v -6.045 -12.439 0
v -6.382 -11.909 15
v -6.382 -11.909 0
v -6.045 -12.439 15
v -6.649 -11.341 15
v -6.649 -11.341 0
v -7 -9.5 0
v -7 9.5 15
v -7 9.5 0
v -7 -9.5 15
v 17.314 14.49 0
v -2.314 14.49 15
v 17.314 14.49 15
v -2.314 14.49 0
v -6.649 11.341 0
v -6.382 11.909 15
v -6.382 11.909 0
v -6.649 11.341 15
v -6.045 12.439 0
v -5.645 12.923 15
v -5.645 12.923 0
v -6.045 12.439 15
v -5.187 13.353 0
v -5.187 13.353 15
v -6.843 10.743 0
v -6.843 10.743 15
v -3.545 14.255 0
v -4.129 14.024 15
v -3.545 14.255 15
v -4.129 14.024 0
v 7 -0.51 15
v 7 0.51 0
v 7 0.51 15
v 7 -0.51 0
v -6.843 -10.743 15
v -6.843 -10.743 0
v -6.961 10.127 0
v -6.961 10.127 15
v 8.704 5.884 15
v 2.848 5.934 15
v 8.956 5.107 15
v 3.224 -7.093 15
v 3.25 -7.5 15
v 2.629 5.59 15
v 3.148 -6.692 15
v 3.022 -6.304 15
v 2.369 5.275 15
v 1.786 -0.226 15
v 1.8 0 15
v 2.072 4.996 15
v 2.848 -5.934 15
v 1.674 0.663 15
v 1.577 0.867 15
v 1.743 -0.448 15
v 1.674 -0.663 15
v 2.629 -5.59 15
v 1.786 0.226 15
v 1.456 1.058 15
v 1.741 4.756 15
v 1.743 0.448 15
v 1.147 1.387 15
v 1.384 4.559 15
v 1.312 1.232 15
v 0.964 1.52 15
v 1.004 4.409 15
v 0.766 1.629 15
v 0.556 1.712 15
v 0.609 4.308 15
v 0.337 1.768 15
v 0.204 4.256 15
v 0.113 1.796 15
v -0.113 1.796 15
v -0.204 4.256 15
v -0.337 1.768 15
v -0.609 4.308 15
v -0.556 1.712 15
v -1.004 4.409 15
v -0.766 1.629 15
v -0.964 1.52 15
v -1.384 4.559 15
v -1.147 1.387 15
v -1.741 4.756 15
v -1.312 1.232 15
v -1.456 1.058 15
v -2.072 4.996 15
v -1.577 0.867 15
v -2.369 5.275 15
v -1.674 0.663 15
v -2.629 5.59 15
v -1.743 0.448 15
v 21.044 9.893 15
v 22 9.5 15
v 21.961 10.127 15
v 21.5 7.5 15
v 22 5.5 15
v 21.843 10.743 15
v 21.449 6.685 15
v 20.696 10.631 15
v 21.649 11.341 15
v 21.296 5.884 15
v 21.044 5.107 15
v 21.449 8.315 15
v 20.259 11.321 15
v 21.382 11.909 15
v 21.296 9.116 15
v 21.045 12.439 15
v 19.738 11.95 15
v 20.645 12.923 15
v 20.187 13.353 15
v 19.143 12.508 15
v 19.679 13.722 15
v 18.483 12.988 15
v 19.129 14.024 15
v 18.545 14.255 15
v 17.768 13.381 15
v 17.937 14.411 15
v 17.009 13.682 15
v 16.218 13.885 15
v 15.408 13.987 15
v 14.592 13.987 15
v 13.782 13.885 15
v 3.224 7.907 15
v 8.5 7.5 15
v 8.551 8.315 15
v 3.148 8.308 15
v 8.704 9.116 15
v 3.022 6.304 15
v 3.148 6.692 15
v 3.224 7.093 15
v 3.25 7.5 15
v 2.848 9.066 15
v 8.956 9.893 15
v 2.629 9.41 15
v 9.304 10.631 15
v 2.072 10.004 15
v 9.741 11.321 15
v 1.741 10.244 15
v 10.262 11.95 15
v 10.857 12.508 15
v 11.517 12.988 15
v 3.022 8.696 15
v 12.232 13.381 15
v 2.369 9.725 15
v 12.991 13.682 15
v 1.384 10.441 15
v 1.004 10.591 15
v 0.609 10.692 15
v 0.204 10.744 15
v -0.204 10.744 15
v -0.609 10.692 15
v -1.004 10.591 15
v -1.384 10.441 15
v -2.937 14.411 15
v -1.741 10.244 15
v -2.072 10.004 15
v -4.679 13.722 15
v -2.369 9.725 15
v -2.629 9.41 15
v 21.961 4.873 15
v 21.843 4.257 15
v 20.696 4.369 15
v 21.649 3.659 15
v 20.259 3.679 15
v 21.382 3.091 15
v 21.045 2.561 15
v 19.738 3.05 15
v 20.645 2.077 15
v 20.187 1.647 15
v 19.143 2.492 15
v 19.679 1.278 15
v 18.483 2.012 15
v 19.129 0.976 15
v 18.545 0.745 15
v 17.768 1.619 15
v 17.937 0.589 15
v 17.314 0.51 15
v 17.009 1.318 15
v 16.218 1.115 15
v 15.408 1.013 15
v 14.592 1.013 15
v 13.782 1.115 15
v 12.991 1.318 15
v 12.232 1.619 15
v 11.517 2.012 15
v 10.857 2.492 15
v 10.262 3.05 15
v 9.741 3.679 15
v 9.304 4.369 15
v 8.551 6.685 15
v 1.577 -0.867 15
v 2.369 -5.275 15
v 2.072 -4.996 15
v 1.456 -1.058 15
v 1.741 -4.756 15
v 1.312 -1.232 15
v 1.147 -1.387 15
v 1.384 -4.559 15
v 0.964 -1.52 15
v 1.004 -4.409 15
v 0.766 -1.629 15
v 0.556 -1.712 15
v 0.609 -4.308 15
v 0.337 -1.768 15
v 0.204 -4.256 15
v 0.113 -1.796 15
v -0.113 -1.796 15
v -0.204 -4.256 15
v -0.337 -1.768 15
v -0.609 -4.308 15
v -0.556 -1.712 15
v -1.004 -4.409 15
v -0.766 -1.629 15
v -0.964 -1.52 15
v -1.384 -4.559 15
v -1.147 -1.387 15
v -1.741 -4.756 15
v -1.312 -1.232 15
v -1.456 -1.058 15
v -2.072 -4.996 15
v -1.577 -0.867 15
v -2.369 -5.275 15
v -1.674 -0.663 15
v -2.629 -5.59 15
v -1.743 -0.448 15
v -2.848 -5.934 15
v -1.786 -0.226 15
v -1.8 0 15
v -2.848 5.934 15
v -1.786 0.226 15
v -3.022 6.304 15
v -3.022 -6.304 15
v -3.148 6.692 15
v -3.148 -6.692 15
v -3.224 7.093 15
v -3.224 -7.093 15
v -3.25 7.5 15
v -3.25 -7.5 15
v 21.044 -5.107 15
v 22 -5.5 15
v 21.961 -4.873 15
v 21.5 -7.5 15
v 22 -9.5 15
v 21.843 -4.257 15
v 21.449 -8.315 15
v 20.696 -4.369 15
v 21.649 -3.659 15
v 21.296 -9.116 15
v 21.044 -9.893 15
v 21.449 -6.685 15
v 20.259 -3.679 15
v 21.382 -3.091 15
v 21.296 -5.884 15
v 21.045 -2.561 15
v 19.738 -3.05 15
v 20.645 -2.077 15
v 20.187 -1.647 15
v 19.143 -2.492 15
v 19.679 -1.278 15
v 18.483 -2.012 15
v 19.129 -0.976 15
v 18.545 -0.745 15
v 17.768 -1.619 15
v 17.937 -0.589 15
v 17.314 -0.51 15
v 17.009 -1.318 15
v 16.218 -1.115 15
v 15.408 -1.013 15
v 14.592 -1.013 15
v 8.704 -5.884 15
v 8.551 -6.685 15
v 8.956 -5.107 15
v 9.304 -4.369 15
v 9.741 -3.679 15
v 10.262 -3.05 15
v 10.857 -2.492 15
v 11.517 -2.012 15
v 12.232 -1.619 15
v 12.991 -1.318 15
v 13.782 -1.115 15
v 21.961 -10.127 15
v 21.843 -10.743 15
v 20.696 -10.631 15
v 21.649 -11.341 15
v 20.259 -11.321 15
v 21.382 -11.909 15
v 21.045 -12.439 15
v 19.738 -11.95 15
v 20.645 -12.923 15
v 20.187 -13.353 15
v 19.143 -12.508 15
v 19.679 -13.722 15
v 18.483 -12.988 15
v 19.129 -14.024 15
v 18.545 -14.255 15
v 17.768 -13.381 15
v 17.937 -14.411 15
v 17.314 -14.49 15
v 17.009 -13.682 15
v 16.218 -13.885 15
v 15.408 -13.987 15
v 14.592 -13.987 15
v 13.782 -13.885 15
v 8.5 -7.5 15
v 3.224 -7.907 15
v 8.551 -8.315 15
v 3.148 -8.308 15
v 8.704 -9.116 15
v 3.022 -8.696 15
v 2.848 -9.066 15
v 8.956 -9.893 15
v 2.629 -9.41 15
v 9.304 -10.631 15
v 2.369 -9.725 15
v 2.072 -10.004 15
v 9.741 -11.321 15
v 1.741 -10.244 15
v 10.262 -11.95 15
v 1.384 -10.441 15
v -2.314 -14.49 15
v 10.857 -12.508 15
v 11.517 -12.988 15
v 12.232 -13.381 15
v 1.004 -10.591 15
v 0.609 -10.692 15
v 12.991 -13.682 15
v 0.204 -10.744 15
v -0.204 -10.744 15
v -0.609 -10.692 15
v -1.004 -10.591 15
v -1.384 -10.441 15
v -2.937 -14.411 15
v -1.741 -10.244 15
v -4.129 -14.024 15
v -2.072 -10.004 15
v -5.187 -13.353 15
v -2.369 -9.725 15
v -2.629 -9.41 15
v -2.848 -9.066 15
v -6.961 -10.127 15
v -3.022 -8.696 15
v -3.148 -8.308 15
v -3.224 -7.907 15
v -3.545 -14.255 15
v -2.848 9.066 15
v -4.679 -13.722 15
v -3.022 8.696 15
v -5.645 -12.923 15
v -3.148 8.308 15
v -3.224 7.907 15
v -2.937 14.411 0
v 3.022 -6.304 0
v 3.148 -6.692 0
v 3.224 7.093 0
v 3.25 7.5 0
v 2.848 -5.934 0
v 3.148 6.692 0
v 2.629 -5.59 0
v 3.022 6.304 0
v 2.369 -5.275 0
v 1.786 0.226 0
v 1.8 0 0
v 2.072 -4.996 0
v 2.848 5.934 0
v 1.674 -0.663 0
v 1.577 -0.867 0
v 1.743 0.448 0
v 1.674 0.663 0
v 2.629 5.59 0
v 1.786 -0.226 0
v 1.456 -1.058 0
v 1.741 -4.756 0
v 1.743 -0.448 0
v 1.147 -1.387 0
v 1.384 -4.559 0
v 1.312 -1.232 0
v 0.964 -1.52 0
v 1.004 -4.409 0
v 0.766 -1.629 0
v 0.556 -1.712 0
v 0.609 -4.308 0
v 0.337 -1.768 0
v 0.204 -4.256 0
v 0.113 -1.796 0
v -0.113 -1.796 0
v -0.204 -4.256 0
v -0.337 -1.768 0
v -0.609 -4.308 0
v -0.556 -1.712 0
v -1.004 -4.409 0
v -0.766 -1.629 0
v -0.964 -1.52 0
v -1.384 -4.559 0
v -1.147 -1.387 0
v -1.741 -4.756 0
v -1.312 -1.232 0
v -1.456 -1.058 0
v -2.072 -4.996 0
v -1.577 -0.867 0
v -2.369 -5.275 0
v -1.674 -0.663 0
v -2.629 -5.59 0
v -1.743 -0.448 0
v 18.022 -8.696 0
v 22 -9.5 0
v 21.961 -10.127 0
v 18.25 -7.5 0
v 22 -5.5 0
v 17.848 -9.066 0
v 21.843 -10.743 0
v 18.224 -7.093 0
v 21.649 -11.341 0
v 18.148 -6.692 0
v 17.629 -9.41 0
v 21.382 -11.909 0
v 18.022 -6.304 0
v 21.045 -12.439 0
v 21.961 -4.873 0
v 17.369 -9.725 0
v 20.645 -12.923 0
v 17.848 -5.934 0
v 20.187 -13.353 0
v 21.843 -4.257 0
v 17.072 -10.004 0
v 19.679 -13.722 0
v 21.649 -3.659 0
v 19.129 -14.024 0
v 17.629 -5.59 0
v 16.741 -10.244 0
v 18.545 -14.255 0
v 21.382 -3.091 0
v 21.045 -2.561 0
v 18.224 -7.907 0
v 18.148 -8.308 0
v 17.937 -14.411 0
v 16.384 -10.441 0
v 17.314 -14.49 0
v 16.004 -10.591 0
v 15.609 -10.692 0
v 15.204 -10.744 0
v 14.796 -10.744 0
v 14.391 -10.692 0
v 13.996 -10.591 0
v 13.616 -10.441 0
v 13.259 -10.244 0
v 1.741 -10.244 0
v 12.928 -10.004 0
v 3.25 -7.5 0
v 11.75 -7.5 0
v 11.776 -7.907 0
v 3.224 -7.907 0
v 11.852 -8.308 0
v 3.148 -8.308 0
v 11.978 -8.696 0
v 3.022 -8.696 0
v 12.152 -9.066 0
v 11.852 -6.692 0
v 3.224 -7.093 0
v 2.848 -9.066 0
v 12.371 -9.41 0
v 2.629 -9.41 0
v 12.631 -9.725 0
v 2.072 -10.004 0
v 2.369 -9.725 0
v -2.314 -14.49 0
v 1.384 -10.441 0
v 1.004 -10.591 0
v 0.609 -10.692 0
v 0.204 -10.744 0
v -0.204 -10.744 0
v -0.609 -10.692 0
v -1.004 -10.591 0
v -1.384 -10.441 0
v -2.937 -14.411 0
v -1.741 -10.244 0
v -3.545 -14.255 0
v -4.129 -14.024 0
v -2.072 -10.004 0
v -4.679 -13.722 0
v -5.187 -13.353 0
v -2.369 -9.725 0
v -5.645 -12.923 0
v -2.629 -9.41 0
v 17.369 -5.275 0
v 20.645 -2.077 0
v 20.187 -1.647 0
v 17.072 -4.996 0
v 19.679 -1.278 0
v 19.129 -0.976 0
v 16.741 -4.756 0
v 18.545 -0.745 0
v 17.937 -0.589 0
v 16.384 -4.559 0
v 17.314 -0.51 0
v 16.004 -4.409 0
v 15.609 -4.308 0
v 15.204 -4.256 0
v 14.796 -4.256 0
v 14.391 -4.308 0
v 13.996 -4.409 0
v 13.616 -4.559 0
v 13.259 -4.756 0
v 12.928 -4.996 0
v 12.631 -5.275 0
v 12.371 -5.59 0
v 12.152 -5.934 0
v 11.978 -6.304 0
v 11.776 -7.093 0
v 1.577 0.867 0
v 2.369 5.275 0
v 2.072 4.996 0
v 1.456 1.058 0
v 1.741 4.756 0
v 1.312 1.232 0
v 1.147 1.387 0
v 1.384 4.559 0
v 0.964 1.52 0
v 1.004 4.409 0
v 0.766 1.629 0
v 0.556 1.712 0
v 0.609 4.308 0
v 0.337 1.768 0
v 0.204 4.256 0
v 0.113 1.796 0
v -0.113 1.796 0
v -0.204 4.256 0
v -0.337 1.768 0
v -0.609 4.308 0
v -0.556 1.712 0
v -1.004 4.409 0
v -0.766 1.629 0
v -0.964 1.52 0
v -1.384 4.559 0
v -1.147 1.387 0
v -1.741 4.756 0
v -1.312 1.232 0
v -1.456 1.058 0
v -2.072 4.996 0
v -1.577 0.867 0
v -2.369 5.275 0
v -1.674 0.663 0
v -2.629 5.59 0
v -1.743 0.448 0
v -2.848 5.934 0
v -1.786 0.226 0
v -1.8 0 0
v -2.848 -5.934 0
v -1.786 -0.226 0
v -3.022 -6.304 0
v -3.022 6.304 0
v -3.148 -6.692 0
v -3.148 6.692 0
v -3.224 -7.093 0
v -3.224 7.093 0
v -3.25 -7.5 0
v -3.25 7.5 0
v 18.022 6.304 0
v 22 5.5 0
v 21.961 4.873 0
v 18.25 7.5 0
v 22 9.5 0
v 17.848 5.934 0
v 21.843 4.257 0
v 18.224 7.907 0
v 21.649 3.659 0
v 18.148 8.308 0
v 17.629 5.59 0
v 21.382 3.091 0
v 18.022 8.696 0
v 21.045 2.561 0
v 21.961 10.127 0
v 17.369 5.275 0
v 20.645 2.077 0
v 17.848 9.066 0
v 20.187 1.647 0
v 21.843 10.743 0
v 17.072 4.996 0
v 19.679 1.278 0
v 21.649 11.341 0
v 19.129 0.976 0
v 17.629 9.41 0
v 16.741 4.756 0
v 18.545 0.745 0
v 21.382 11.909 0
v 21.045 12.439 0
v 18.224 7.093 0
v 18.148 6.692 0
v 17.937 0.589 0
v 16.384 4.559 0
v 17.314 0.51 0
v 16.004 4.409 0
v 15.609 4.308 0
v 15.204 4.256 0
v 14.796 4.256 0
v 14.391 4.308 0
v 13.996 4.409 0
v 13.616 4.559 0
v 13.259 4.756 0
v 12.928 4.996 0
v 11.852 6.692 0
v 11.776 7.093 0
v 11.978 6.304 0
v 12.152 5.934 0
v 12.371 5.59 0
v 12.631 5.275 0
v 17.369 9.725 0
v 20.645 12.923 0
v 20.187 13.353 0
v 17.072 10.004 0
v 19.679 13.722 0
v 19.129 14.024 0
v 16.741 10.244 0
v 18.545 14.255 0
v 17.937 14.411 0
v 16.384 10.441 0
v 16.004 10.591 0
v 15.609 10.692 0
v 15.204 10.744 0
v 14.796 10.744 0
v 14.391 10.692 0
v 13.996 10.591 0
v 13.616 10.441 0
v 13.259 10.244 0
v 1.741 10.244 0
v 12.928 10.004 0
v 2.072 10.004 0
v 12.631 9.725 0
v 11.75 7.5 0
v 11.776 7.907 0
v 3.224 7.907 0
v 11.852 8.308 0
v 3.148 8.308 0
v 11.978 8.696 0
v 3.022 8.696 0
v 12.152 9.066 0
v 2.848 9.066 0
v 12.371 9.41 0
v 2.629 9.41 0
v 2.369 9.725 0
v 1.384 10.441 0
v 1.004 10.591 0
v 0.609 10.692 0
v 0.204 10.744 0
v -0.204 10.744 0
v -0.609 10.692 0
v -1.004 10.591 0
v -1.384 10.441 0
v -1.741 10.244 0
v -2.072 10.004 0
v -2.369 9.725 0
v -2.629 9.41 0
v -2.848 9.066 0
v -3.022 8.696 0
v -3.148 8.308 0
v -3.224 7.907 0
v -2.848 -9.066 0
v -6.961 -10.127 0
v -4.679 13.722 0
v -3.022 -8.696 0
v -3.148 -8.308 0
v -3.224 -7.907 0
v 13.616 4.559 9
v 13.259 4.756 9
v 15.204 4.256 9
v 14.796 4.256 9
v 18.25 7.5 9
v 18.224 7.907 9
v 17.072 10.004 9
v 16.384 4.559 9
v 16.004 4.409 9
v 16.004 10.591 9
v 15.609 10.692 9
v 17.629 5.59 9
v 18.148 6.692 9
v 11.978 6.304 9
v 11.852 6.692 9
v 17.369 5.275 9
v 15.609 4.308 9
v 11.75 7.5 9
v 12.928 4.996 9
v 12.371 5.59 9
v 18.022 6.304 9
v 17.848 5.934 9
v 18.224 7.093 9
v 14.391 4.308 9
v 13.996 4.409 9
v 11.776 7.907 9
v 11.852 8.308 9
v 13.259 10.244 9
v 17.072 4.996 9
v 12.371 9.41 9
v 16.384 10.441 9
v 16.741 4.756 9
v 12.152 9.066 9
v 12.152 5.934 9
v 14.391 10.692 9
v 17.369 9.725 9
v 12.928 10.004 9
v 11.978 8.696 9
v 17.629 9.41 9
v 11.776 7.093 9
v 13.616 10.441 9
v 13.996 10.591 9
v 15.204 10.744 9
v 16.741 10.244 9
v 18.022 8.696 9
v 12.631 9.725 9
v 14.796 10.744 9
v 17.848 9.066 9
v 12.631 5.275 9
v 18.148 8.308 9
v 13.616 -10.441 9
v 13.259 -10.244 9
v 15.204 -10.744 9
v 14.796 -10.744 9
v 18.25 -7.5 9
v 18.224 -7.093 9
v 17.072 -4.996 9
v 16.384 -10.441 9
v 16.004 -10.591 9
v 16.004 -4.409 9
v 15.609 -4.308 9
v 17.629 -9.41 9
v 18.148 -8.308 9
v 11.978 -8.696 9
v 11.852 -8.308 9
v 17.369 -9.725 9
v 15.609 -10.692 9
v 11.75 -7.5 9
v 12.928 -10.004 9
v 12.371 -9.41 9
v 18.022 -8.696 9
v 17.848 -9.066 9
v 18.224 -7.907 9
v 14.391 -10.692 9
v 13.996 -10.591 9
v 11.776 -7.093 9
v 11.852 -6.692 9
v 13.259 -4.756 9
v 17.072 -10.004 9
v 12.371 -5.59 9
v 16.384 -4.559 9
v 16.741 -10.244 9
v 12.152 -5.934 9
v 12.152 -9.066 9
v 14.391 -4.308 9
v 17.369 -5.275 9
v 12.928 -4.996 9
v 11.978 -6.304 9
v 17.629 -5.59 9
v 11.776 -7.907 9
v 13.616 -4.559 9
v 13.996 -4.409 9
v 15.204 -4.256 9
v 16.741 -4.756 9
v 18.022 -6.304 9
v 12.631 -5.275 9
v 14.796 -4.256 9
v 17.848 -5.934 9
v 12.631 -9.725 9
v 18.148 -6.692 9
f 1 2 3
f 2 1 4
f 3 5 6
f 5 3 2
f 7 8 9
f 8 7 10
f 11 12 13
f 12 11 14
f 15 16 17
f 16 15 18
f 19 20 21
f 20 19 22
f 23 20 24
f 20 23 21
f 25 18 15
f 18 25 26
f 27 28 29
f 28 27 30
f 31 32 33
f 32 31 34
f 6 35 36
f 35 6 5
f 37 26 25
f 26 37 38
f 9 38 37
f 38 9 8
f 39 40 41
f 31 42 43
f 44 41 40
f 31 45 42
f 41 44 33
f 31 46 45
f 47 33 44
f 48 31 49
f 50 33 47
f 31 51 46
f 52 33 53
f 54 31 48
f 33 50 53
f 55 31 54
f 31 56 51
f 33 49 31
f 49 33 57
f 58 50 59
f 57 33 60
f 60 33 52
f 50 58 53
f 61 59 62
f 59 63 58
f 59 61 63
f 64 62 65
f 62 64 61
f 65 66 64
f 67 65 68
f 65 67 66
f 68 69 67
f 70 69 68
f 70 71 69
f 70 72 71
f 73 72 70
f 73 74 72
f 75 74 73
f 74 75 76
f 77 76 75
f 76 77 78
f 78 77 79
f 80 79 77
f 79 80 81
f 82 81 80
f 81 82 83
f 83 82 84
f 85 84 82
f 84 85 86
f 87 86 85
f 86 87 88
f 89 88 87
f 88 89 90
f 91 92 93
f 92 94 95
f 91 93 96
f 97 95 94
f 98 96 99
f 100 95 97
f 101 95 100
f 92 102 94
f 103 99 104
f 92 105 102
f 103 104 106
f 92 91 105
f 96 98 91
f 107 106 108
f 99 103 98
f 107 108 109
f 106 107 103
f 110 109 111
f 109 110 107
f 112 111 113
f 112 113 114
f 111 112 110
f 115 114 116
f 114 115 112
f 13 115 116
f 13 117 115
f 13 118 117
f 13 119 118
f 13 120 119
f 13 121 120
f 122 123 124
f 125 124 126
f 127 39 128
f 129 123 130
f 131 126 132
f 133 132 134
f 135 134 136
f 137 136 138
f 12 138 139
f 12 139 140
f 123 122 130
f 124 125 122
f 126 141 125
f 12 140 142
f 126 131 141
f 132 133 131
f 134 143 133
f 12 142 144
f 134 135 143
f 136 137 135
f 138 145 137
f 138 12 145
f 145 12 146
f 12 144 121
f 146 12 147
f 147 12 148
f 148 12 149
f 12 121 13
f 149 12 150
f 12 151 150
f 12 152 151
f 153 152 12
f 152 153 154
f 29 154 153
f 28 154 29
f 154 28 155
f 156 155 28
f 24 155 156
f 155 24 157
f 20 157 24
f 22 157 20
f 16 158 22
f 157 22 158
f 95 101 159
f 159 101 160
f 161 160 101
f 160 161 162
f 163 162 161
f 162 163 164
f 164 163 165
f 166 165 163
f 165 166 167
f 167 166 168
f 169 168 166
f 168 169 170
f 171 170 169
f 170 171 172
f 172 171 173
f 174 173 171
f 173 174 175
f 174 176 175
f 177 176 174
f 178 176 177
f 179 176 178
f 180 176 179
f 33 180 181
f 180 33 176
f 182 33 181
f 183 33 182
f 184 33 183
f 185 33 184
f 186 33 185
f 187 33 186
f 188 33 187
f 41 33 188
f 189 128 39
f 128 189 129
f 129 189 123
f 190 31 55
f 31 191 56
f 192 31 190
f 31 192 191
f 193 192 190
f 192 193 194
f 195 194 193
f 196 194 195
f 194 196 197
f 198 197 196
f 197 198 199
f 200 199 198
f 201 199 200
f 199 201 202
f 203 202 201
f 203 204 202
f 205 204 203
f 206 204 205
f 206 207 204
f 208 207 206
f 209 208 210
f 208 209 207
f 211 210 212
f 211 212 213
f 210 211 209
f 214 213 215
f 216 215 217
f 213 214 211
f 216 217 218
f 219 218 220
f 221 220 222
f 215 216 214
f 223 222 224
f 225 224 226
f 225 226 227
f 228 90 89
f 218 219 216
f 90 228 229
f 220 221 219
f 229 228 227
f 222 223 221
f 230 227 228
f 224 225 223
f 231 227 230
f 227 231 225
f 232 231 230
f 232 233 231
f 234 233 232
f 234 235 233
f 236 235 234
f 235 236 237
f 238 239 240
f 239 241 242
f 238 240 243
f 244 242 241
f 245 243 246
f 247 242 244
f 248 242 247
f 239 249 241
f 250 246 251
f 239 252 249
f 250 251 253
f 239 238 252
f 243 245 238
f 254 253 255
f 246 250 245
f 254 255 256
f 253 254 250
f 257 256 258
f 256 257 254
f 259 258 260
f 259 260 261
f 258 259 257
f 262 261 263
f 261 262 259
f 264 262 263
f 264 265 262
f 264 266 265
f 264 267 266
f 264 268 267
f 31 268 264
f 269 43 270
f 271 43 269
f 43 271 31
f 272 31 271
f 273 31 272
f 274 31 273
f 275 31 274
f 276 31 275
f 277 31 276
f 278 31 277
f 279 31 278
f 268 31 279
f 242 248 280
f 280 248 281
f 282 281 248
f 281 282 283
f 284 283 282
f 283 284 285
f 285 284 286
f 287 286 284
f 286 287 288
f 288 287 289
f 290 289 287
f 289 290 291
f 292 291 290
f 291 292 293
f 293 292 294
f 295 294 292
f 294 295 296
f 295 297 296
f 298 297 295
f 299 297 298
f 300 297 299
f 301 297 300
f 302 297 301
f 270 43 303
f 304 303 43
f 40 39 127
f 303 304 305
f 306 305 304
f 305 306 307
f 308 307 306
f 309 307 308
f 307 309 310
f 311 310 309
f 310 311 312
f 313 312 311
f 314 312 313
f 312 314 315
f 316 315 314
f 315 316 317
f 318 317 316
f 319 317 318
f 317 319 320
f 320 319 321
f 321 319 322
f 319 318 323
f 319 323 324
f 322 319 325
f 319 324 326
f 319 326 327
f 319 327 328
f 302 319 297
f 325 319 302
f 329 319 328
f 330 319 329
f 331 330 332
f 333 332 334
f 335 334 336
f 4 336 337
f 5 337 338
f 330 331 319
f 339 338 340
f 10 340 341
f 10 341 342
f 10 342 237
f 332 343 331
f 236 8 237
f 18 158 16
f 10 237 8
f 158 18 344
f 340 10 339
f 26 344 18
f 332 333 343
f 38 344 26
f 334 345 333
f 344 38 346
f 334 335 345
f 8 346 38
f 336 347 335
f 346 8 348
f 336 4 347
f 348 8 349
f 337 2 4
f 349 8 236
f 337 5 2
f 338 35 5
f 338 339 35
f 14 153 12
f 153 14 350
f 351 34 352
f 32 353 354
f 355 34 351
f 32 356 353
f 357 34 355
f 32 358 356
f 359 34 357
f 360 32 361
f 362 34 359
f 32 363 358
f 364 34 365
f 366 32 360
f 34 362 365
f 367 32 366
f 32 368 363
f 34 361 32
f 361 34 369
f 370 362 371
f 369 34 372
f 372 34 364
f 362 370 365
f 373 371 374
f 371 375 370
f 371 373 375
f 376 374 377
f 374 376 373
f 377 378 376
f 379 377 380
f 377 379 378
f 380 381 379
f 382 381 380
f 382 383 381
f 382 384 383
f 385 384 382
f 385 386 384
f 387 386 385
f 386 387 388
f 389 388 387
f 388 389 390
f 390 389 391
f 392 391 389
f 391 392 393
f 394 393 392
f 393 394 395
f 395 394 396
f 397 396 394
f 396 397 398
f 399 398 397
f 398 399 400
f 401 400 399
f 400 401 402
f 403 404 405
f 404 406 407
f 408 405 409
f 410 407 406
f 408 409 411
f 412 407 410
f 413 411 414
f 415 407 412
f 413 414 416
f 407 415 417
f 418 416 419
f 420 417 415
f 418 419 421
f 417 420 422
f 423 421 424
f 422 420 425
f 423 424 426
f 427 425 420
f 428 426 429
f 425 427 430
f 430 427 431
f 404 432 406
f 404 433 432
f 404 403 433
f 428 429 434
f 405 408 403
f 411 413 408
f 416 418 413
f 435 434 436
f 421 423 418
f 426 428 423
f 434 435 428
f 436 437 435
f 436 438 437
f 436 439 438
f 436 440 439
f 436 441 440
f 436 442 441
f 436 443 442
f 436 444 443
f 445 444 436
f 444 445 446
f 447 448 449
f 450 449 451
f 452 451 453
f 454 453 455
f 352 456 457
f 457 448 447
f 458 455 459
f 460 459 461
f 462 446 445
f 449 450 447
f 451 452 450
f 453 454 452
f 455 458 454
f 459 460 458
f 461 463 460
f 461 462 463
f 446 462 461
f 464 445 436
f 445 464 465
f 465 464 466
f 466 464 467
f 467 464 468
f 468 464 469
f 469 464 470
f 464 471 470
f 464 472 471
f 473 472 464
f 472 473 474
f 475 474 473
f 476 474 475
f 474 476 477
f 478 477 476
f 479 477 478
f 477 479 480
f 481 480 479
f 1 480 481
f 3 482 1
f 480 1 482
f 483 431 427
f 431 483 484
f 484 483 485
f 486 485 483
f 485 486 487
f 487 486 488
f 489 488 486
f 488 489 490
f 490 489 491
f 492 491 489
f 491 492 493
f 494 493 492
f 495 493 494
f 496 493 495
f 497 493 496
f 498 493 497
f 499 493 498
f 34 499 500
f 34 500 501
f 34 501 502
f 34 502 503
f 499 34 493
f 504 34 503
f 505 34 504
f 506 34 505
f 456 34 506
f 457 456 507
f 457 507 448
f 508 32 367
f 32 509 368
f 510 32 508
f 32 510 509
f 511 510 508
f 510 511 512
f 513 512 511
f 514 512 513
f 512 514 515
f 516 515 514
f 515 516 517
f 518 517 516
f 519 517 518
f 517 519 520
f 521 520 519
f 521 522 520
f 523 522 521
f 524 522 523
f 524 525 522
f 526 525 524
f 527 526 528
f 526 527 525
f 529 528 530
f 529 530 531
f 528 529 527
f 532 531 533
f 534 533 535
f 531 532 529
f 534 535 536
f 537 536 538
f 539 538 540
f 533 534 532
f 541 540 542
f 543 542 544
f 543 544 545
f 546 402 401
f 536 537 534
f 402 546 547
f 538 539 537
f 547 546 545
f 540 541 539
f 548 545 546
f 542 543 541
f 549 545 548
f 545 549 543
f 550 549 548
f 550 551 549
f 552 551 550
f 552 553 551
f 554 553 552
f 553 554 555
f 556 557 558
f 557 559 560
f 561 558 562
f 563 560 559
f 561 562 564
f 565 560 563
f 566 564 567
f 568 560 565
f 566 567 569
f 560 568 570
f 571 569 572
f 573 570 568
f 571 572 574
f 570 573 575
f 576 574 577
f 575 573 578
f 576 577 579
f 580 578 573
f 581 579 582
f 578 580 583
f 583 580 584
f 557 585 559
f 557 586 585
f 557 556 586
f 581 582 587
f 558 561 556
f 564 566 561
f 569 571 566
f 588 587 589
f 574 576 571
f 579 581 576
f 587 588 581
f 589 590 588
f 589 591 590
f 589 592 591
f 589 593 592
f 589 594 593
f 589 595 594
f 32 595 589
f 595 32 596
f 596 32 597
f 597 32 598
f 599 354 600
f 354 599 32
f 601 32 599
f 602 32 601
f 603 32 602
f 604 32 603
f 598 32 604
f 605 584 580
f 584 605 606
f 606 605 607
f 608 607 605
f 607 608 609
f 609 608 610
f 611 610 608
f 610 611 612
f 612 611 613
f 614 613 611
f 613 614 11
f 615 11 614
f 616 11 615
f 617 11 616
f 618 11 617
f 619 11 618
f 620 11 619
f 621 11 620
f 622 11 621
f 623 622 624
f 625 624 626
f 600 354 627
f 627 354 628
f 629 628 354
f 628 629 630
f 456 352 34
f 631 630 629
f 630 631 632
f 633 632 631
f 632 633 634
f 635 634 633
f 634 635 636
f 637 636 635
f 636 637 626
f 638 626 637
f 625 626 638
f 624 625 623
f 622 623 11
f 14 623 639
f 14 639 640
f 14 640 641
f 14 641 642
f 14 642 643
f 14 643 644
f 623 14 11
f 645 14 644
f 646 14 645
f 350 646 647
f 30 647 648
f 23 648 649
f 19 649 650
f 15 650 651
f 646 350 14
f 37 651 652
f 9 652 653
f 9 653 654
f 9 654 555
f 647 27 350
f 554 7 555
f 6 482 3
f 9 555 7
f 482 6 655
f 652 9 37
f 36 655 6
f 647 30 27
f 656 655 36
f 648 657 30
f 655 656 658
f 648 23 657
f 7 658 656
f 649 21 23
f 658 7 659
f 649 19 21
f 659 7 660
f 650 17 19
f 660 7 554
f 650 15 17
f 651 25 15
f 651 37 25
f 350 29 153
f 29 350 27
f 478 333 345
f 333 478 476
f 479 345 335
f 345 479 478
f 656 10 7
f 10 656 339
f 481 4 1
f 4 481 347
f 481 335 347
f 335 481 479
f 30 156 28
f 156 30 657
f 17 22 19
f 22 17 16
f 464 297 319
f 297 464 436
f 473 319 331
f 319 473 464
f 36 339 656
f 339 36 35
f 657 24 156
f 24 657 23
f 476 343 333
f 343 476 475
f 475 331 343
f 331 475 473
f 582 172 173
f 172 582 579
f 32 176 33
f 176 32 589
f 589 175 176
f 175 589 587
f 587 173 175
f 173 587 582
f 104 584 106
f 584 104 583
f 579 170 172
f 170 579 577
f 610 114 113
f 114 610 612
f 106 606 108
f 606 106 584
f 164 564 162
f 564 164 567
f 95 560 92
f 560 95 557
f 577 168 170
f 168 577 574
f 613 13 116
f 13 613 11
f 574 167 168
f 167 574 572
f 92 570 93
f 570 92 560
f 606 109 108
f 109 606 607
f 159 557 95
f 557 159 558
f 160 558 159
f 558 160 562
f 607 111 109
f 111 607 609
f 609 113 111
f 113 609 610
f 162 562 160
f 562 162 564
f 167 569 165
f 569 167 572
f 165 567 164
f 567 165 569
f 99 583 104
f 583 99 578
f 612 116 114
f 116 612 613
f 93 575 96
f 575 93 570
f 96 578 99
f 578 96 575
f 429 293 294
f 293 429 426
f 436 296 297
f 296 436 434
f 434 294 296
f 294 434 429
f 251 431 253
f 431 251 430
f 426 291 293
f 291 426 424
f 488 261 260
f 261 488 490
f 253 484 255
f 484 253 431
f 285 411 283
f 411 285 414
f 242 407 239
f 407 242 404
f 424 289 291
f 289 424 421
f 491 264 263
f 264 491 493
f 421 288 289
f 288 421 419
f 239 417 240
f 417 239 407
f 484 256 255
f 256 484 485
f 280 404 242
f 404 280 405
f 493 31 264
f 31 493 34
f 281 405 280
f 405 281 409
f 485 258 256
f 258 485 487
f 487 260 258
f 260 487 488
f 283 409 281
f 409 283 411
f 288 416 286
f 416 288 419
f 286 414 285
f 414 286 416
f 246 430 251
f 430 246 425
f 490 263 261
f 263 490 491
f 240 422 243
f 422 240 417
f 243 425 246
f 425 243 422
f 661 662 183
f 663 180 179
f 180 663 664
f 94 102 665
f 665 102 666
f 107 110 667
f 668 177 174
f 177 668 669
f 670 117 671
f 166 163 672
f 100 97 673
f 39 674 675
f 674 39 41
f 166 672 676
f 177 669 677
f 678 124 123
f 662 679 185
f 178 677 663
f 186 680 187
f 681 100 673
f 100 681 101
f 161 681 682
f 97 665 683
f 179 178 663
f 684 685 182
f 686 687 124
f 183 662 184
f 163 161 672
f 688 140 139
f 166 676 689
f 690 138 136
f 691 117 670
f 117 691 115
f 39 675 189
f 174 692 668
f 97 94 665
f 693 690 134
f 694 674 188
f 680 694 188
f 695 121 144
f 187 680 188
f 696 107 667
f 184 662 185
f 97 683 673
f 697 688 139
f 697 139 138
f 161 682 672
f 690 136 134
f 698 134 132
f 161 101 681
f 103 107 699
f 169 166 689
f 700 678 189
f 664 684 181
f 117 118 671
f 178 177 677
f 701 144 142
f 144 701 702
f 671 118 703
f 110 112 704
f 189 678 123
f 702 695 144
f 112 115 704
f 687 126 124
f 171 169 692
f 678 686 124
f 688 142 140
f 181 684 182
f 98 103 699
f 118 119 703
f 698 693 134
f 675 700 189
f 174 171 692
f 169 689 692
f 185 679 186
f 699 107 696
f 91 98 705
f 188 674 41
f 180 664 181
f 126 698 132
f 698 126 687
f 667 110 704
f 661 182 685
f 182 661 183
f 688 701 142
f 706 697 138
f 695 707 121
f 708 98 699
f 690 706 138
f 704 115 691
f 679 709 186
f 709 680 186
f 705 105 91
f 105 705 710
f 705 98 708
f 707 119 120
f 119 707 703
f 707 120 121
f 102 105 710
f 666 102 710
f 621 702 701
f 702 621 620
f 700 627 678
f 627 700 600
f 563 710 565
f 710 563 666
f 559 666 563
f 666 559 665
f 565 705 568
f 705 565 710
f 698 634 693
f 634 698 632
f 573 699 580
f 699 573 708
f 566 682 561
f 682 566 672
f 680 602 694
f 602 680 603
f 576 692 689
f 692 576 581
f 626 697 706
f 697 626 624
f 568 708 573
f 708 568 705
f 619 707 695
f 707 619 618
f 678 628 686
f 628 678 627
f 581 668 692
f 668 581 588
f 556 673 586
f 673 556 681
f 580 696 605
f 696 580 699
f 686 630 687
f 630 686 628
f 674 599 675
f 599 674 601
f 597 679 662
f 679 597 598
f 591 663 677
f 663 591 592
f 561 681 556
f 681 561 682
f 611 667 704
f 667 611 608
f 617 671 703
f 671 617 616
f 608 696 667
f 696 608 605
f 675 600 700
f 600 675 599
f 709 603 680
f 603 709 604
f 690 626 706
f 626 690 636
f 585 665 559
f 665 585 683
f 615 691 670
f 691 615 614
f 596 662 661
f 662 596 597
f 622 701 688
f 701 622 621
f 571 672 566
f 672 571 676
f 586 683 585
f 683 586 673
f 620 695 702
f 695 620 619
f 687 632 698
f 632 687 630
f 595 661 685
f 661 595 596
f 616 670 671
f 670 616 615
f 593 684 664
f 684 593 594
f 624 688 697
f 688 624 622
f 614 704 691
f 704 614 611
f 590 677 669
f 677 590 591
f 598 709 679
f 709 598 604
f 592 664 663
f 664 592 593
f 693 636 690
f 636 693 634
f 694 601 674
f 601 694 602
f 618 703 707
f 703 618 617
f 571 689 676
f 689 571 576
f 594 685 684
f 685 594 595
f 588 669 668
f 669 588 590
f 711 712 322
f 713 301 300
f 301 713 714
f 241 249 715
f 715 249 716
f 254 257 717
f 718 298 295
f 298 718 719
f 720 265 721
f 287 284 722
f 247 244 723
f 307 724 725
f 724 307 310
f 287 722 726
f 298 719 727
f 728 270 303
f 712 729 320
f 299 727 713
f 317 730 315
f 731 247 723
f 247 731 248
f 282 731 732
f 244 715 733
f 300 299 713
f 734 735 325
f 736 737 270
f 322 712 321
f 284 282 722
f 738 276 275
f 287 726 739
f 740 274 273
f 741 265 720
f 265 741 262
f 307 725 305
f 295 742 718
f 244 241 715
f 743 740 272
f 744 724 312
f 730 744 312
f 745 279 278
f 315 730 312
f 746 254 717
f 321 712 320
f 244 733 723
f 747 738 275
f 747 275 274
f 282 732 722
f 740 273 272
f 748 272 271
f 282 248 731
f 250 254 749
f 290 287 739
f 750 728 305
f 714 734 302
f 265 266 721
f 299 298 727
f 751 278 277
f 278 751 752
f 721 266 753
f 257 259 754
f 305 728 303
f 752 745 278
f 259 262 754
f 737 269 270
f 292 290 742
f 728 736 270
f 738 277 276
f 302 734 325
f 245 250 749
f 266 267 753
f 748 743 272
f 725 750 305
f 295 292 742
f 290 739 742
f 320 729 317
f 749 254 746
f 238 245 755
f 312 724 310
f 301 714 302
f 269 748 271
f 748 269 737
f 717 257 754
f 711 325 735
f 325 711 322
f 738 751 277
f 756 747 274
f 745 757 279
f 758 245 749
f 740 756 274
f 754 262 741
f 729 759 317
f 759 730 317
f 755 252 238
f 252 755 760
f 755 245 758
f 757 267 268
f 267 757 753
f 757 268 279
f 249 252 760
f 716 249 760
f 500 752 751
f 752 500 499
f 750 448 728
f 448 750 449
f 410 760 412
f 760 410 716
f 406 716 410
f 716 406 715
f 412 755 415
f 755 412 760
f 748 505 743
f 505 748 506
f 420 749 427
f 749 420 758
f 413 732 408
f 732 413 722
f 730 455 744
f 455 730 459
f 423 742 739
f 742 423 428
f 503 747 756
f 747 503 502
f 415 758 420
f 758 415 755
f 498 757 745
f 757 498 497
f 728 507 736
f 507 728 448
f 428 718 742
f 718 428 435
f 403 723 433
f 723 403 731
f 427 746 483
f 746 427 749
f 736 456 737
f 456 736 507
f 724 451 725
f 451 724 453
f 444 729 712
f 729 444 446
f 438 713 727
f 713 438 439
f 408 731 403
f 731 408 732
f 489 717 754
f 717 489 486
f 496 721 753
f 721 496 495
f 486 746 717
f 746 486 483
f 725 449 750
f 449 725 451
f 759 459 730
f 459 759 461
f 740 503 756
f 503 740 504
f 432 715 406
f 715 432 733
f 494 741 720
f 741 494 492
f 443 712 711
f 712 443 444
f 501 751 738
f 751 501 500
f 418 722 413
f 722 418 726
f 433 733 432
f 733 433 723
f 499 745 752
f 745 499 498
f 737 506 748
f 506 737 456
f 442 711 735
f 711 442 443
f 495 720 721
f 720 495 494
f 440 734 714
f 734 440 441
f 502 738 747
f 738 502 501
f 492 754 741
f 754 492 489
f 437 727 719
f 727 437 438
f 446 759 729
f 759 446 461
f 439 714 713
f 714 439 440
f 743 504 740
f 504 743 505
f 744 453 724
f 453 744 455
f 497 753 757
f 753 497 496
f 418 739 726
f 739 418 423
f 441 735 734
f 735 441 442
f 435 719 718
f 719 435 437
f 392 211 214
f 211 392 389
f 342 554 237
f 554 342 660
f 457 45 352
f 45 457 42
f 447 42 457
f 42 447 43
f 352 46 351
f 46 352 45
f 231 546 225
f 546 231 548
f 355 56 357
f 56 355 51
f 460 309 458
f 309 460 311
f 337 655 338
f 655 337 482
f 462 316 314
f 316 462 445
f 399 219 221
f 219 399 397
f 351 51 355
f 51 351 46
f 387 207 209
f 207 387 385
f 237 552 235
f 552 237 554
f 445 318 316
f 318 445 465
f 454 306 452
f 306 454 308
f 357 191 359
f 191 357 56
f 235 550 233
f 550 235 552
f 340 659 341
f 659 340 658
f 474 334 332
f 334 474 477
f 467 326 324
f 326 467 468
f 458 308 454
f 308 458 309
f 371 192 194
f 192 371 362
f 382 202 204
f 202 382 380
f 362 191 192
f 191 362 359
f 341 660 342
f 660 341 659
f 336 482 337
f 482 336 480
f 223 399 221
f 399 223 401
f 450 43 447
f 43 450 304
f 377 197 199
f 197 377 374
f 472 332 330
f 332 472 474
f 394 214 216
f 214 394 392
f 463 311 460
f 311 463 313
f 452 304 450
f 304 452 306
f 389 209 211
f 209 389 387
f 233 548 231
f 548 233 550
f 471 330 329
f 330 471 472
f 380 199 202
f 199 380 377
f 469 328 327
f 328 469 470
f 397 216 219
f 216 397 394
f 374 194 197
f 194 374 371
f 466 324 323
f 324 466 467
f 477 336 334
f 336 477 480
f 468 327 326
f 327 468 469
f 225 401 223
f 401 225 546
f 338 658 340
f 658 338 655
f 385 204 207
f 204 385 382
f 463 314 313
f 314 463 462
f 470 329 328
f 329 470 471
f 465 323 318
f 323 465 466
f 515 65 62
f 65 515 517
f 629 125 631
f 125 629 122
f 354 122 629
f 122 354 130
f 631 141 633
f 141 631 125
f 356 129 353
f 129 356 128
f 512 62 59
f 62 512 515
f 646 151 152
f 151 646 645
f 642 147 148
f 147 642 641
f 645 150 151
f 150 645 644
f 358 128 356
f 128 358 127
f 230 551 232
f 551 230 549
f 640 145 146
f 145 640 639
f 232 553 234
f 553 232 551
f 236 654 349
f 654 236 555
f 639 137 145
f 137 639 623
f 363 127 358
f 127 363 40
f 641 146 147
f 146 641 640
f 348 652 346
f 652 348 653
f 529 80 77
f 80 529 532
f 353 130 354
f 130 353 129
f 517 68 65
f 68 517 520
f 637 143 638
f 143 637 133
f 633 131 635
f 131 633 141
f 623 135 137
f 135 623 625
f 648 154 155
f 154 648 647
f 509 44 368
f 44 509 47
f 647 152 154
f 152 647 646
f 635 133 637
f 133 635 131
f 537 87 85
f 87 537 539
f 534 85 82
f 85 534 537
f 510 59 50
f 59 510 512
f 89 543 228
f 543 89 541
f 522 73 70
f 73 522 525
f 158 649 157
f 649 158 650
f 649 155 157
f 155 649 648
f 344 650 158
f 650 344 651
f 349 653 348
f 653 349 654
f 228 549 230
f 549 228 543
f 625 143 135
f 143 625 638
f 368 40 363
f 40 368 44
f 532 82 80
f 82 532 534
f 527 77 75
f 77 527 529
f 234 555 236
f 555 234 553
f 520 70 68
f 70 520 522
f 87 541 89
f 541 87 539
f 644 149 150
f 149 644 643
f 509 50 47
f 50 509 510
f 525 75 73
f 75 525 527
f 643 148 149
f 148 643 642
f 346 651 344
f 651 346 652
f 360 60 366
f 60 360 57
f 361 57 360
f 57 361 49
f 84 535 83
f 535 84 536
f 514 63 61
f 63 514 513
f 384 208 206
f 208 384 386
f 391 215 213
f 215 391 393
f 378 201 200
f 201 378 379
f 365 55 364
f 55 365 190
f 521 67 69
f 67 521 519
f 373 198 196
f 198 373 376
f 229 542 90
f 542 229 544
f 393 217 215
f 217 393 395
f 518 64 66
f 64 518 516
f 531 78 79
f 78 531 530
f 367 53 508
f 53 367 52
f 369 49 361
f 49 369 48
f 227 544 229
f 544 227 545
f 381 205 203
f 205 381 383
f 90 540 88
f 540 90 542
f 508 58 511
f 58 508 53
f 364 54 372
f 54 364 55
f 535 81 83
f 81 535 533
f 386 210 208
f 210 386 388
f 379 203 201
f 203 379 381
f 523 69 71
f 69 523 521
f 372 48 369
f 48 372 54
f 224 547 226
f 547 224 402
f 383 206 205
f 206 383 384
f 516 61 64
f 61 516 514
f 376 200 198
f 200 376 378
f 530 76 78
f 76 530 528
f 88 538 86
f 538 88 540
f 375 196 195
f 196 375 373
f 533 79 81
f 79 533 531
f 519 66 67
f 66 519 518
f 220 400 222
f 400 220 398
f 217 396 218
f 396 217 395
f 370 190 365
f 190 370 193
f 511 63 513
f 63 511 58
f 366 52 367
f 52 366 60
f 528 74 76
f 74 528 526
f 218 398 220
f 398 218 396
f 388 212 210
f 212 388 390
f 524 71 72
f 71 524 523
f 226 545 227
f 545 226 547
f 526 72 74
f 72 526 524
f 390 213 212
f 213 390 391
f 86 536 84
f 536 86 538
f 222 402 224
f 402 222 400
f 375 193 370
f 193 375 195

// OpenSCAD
$fn = 50;


difference() {
	union() {
		hull() {
			translate(v = [-2.0000000000, 9.5000000000, 0]) {
				cylinder(h = 15, r = 5);
			}
			translate(v = [2.0000000000, 9.5000000000, 0]) {
				cylinder(h = 15, r = 5);
			}
			translate(v = [-2.0000000000, -9.5000000000, 0]) {
				cylinder(h = 15, r = 5);
			}
			translate(v = [2.0000000000, -9.5000000000, 0]) {
				cylinder(h = 15, r = 5);
			}
		}
		translate(v = [7.5000000000, 7.5000000000, 0]) {
			hull() {
				translate(v = [-9.5000000000, 2.0000000000, 0]) {
					cylinder(h = 15, r = 5);
				}
				translate(v = [9.5000000000, 2.0000000000, 0]) {
					cylinder(h = 15, r = 5);
				}
				translate(v = [-9.5000000000, -2.0000000000, 0]) {
					cylinder(h = 15, r = 5);
				}
				translate(v = [9.5000000000, -2.0000000000, 0]) {
					cylinder(h = 15, r = 5);
				}
			}
		}
		translate(v = [7.5000000000, -7.5000000000, 0]) {
			hull() {
				translate(v = [-9.5000000000, 2.0000000000, 0]) {
					cylinder(h = 15, r = 5);
				}
				translate(v = [9.5000000000, 2.0000000000, 0]) {
					cylinder(h = 15, r = 5);
				}
				translate(v = [-9.5000000000, -2.0000000000, 0]) {
					cylinder(h = 15, r = 5);
				}
				translate(v = [9.5000000000, -2.0000000000, 0]) {
					cylinder(h = 15, r = 5);
				}
			}
		}
	}
	union() {
		translate(v = [15.0000000000, 7.5000000000, 15]) {
			rotate(a = [0, 0, 0]) {
				difference() {
					union() {
						#translate(v = [0, 0, -15.0000000000]) {
							cylinder(h = 15, r = 2.2500000000);
						}
						#translate(v = [0, 0, -6]) {
							cylinder(h = 6, r1 = 3.2500000000, r2 = 6.5000000000);
						}
						#translate(v = [0, 0, -15.0000000000]) {
							cylinder(h = 15, r = 3.2500000000);
						}
						#translate(v = [0, 0, -15.0000000000]) {
							cylinder(h = 15, r = 2.2500000000);
						}
					}
					union();
				}
			}
		}
		translate(v = [15.0000000000, -7.5000000000, 15]) {
			rotate(a = [0, 0, 0]) {
				difference() {
					union() {
						#translate(v = [0, 0, -15.0000000000]) {
							cylinder(h = 15, r = 2.2500000000);
						}
						#translate(v = [0, 0, -6]) {
							cylinder(h = 6, r1 = 3.2500000000, r2 = 6.5000000000);
						}
						#translate(v = [0, 0, -15.0000000000]) {
							cylinder(h = 15, r = 3.2500000000);
						}
						#translate(v = [0, 0, -15.0000000000]) {
							cylinder(h = 15, r = 2.2500000000);
						}
					}
					union();
				}
			}
		}
		translate(v = [0.0000000000, -7.5000000000, 0]) {
			translate(v = [0, 0, -100]) {
				cylinder(h = 200, r = 3.2500000000);
			}
		}
		translate(v = [0.0000000000, 7.5000000000, 0]) {
			translate(v = [0, 0, -100]) {
				cylinder(h = 200, r = 3.2500000000);
			}
		}
		translate(v = [0.0000000000, -7.5000000000, 0]) {
			translate(v = [0, 0, -100]) {
				cylinder(h = 200, r = 1.8000000000);
			}
		}
		translate(v = [0, 0, -100]) {
			cylinder(h = 200, r = 1.8000000000);
		}
		translate(v = [0.0000000000, 7.5000000000, 0]) {
			translate(v = [0, 0, -100]) {
				cylinder(h = 200, r = 1.8000000000);
			}
		}
	}
}
